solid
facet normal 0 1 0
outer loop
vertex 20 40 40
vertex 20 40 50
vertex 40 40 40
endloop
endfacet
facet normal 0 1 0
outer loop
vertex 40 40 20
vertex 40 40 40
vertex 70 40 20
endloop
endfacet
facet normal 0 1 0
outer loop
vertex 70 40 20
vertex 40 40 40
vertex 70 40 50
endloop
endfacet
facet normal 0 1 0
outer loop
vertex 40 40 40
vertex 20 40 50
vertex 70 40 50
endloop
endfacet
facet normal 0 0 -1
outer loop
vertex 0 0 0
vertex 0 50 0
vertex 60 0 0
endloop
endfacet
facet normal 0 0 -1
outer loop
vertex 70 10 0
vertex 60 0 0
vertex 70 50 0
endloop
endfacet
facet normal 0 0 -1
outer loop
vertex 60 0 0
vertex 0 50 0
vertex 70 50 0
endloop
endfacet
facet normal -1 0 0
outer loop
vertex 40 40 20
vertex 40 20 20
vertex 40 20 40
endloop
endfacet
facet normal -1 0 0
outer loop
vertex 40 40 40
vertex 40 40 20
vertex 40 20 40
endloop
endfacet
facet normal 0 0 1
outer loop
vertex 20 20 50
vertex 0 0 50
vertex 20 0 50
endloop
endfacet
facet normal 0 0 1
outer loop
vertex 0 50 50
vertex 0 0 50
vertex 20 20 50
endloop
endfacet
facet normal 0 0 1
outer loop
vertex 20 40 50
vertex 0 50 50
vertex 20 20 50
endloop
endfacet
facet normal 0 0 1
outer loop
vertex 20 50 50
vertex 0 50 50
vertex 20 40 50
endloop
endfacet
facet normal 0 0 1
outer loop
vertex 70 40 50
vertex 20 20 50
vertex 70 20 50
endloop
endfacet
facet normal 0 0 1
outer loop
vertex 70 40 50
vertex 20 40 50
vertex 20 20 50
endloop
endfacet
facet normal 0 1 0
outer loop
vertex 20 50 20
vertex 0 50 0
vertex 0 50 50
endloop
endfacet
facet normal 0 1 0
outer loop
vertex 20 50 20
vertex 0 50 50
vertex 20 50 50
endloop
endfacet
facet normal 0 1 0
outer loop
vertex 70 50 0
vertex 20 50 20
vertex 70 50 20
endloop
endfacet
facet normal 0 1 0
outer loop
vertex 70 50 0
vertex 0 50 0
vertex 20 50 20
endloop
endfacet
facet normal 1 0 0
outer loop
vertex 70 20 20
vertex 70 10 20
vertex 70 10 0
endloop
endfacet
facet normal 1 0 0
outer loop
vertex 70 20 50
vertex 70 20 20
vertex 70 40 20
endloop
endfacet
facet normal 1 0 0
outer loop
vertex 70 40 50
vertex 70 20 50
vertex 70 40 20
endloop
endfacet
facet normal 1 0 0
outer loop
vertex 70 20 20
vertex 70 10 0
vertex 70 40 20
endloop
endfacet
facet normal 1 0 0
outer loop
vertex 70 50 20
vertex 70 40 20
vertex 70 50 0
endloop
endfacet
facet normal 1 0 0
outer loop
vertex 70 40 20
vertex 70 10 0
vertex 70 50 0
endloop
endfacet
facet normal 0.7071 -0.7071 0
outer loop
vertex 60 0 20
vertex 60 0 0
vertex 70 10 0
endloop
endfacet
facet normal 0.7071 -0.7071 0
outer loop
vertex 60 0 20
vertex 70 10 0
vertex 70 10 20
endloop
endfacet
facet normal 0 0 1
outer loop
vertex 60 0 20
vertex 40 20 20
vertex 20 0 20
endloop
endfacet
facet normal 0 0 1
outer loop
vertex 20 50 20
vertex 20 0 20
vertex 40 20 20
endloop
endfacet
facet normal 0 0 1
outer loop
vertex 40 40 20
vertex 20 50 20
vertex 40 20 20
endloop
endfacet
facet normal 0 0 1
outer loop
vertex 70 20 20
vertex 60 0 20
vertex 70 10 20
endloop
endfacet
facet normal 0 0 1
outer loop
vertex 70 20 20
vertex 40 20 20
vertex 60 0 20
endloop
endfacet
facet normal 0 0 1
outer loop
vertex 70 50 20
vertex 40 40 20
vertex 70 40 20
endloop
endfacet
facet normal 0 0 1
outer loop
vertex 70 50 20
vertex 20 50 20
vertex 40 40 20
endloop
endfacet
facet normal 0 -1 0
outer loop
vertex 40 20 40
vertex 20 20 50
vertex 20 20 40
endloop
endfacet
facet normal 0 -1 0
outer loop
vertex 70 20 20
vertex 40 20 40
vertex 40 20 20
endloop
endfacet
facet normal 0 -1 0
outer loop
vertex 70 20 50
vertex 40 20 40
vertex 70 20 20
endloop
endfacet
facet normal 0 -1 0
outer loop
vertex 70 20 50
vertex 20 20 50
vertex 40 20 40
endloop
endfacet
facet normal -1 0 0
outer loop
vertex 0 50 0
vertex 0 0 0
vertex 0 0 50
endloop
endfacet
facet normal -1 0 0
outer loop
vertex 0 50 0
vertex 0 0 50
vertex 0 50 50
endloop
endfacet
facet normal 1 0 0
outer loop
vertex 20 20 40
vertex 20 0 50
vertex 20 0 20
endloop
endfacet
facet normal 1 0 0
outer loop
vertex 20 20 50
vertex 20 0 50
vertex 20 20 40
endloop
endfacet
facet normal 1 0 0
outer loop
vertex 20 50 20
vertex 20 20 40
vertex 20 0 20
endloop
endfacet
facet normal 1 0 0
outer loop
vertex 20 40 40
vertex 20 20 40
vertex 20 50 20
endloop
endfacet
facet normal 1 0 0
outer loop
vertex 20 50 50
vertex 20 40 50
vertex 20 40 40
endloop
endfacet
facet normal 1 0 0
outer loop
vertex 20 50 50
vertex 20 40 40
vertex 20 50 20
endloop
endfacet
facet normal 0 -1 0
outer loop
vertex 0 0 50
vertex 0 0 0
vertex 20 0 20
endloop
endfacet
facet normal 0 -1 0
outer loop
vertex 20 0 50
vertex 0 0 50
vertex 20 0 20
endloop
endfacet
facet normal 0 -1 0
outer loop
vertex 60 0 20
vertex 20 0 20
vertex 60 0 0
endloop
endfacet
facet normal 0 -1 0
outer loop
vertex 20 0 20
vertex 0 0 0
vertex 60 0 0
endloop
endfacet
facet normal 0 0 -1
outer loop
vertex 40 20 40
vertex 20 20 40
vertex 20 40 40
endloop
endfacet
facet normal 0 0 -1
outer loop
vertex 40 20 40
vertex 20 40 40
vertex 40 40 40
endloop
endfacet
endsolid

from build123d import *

# Parameters (mm, degrees)
F0_W     = 70
F0_H     = 50
F1_DEPTH = 50
F2_W     = 50
F2_H     = 20
F3_DEPTH = 30
F4_W     = 50
F4_H     = 10
F5_DEPTH = 30
F6_W     = 20
F6_H     = 20
F7_DEPTH = 20
F8_SIZE  = 10


with BuildPart() as f1:
    # F0 (on Top) → F1 (new body)
    with BuildSketch(Plane.XY):
        with Locations((35, 25)):
            Rectangle(F0_W, F0_H)
    extrude(amount=F1_DEPTH)

    # F2 (on face) → F3 (cut)
    with BuildSketch(Plane.XY.offset(50)):
        with Locations((45, 10)):
            Rectangle(F2_W, F2_H)
    extrude(amount=-F3_DEPTH, mode=Mode.SUBTRACT)

    # F4 (on face) → F5 (cut)
    with BuildSketch(Plane.XY.offset(50)):
        with Locations((45, 45)):
            Rectangle(F4_W, F4_H)
    extrude(amount=-F5_DEPTH, mode=Mode.SUBTRACT)

    # F6 (on face) → F7 (cut, through all)
    with BuildSketch(Plane.XZ.offset(-20)):
        with Locations((30, 30)):
            Rectangle(F6_W, F6_H)
    extrude(amount=-F7_DEPTH, mode=Mode.SUBTRACT)

    # F8
    f8_edges = [f1.edges().sort_by_distance(p)[0] for p in [
        (70, 0, 10),
    ]]
    chamfer(f8_edges, length=F8_SIZE)


solid = f1.part
